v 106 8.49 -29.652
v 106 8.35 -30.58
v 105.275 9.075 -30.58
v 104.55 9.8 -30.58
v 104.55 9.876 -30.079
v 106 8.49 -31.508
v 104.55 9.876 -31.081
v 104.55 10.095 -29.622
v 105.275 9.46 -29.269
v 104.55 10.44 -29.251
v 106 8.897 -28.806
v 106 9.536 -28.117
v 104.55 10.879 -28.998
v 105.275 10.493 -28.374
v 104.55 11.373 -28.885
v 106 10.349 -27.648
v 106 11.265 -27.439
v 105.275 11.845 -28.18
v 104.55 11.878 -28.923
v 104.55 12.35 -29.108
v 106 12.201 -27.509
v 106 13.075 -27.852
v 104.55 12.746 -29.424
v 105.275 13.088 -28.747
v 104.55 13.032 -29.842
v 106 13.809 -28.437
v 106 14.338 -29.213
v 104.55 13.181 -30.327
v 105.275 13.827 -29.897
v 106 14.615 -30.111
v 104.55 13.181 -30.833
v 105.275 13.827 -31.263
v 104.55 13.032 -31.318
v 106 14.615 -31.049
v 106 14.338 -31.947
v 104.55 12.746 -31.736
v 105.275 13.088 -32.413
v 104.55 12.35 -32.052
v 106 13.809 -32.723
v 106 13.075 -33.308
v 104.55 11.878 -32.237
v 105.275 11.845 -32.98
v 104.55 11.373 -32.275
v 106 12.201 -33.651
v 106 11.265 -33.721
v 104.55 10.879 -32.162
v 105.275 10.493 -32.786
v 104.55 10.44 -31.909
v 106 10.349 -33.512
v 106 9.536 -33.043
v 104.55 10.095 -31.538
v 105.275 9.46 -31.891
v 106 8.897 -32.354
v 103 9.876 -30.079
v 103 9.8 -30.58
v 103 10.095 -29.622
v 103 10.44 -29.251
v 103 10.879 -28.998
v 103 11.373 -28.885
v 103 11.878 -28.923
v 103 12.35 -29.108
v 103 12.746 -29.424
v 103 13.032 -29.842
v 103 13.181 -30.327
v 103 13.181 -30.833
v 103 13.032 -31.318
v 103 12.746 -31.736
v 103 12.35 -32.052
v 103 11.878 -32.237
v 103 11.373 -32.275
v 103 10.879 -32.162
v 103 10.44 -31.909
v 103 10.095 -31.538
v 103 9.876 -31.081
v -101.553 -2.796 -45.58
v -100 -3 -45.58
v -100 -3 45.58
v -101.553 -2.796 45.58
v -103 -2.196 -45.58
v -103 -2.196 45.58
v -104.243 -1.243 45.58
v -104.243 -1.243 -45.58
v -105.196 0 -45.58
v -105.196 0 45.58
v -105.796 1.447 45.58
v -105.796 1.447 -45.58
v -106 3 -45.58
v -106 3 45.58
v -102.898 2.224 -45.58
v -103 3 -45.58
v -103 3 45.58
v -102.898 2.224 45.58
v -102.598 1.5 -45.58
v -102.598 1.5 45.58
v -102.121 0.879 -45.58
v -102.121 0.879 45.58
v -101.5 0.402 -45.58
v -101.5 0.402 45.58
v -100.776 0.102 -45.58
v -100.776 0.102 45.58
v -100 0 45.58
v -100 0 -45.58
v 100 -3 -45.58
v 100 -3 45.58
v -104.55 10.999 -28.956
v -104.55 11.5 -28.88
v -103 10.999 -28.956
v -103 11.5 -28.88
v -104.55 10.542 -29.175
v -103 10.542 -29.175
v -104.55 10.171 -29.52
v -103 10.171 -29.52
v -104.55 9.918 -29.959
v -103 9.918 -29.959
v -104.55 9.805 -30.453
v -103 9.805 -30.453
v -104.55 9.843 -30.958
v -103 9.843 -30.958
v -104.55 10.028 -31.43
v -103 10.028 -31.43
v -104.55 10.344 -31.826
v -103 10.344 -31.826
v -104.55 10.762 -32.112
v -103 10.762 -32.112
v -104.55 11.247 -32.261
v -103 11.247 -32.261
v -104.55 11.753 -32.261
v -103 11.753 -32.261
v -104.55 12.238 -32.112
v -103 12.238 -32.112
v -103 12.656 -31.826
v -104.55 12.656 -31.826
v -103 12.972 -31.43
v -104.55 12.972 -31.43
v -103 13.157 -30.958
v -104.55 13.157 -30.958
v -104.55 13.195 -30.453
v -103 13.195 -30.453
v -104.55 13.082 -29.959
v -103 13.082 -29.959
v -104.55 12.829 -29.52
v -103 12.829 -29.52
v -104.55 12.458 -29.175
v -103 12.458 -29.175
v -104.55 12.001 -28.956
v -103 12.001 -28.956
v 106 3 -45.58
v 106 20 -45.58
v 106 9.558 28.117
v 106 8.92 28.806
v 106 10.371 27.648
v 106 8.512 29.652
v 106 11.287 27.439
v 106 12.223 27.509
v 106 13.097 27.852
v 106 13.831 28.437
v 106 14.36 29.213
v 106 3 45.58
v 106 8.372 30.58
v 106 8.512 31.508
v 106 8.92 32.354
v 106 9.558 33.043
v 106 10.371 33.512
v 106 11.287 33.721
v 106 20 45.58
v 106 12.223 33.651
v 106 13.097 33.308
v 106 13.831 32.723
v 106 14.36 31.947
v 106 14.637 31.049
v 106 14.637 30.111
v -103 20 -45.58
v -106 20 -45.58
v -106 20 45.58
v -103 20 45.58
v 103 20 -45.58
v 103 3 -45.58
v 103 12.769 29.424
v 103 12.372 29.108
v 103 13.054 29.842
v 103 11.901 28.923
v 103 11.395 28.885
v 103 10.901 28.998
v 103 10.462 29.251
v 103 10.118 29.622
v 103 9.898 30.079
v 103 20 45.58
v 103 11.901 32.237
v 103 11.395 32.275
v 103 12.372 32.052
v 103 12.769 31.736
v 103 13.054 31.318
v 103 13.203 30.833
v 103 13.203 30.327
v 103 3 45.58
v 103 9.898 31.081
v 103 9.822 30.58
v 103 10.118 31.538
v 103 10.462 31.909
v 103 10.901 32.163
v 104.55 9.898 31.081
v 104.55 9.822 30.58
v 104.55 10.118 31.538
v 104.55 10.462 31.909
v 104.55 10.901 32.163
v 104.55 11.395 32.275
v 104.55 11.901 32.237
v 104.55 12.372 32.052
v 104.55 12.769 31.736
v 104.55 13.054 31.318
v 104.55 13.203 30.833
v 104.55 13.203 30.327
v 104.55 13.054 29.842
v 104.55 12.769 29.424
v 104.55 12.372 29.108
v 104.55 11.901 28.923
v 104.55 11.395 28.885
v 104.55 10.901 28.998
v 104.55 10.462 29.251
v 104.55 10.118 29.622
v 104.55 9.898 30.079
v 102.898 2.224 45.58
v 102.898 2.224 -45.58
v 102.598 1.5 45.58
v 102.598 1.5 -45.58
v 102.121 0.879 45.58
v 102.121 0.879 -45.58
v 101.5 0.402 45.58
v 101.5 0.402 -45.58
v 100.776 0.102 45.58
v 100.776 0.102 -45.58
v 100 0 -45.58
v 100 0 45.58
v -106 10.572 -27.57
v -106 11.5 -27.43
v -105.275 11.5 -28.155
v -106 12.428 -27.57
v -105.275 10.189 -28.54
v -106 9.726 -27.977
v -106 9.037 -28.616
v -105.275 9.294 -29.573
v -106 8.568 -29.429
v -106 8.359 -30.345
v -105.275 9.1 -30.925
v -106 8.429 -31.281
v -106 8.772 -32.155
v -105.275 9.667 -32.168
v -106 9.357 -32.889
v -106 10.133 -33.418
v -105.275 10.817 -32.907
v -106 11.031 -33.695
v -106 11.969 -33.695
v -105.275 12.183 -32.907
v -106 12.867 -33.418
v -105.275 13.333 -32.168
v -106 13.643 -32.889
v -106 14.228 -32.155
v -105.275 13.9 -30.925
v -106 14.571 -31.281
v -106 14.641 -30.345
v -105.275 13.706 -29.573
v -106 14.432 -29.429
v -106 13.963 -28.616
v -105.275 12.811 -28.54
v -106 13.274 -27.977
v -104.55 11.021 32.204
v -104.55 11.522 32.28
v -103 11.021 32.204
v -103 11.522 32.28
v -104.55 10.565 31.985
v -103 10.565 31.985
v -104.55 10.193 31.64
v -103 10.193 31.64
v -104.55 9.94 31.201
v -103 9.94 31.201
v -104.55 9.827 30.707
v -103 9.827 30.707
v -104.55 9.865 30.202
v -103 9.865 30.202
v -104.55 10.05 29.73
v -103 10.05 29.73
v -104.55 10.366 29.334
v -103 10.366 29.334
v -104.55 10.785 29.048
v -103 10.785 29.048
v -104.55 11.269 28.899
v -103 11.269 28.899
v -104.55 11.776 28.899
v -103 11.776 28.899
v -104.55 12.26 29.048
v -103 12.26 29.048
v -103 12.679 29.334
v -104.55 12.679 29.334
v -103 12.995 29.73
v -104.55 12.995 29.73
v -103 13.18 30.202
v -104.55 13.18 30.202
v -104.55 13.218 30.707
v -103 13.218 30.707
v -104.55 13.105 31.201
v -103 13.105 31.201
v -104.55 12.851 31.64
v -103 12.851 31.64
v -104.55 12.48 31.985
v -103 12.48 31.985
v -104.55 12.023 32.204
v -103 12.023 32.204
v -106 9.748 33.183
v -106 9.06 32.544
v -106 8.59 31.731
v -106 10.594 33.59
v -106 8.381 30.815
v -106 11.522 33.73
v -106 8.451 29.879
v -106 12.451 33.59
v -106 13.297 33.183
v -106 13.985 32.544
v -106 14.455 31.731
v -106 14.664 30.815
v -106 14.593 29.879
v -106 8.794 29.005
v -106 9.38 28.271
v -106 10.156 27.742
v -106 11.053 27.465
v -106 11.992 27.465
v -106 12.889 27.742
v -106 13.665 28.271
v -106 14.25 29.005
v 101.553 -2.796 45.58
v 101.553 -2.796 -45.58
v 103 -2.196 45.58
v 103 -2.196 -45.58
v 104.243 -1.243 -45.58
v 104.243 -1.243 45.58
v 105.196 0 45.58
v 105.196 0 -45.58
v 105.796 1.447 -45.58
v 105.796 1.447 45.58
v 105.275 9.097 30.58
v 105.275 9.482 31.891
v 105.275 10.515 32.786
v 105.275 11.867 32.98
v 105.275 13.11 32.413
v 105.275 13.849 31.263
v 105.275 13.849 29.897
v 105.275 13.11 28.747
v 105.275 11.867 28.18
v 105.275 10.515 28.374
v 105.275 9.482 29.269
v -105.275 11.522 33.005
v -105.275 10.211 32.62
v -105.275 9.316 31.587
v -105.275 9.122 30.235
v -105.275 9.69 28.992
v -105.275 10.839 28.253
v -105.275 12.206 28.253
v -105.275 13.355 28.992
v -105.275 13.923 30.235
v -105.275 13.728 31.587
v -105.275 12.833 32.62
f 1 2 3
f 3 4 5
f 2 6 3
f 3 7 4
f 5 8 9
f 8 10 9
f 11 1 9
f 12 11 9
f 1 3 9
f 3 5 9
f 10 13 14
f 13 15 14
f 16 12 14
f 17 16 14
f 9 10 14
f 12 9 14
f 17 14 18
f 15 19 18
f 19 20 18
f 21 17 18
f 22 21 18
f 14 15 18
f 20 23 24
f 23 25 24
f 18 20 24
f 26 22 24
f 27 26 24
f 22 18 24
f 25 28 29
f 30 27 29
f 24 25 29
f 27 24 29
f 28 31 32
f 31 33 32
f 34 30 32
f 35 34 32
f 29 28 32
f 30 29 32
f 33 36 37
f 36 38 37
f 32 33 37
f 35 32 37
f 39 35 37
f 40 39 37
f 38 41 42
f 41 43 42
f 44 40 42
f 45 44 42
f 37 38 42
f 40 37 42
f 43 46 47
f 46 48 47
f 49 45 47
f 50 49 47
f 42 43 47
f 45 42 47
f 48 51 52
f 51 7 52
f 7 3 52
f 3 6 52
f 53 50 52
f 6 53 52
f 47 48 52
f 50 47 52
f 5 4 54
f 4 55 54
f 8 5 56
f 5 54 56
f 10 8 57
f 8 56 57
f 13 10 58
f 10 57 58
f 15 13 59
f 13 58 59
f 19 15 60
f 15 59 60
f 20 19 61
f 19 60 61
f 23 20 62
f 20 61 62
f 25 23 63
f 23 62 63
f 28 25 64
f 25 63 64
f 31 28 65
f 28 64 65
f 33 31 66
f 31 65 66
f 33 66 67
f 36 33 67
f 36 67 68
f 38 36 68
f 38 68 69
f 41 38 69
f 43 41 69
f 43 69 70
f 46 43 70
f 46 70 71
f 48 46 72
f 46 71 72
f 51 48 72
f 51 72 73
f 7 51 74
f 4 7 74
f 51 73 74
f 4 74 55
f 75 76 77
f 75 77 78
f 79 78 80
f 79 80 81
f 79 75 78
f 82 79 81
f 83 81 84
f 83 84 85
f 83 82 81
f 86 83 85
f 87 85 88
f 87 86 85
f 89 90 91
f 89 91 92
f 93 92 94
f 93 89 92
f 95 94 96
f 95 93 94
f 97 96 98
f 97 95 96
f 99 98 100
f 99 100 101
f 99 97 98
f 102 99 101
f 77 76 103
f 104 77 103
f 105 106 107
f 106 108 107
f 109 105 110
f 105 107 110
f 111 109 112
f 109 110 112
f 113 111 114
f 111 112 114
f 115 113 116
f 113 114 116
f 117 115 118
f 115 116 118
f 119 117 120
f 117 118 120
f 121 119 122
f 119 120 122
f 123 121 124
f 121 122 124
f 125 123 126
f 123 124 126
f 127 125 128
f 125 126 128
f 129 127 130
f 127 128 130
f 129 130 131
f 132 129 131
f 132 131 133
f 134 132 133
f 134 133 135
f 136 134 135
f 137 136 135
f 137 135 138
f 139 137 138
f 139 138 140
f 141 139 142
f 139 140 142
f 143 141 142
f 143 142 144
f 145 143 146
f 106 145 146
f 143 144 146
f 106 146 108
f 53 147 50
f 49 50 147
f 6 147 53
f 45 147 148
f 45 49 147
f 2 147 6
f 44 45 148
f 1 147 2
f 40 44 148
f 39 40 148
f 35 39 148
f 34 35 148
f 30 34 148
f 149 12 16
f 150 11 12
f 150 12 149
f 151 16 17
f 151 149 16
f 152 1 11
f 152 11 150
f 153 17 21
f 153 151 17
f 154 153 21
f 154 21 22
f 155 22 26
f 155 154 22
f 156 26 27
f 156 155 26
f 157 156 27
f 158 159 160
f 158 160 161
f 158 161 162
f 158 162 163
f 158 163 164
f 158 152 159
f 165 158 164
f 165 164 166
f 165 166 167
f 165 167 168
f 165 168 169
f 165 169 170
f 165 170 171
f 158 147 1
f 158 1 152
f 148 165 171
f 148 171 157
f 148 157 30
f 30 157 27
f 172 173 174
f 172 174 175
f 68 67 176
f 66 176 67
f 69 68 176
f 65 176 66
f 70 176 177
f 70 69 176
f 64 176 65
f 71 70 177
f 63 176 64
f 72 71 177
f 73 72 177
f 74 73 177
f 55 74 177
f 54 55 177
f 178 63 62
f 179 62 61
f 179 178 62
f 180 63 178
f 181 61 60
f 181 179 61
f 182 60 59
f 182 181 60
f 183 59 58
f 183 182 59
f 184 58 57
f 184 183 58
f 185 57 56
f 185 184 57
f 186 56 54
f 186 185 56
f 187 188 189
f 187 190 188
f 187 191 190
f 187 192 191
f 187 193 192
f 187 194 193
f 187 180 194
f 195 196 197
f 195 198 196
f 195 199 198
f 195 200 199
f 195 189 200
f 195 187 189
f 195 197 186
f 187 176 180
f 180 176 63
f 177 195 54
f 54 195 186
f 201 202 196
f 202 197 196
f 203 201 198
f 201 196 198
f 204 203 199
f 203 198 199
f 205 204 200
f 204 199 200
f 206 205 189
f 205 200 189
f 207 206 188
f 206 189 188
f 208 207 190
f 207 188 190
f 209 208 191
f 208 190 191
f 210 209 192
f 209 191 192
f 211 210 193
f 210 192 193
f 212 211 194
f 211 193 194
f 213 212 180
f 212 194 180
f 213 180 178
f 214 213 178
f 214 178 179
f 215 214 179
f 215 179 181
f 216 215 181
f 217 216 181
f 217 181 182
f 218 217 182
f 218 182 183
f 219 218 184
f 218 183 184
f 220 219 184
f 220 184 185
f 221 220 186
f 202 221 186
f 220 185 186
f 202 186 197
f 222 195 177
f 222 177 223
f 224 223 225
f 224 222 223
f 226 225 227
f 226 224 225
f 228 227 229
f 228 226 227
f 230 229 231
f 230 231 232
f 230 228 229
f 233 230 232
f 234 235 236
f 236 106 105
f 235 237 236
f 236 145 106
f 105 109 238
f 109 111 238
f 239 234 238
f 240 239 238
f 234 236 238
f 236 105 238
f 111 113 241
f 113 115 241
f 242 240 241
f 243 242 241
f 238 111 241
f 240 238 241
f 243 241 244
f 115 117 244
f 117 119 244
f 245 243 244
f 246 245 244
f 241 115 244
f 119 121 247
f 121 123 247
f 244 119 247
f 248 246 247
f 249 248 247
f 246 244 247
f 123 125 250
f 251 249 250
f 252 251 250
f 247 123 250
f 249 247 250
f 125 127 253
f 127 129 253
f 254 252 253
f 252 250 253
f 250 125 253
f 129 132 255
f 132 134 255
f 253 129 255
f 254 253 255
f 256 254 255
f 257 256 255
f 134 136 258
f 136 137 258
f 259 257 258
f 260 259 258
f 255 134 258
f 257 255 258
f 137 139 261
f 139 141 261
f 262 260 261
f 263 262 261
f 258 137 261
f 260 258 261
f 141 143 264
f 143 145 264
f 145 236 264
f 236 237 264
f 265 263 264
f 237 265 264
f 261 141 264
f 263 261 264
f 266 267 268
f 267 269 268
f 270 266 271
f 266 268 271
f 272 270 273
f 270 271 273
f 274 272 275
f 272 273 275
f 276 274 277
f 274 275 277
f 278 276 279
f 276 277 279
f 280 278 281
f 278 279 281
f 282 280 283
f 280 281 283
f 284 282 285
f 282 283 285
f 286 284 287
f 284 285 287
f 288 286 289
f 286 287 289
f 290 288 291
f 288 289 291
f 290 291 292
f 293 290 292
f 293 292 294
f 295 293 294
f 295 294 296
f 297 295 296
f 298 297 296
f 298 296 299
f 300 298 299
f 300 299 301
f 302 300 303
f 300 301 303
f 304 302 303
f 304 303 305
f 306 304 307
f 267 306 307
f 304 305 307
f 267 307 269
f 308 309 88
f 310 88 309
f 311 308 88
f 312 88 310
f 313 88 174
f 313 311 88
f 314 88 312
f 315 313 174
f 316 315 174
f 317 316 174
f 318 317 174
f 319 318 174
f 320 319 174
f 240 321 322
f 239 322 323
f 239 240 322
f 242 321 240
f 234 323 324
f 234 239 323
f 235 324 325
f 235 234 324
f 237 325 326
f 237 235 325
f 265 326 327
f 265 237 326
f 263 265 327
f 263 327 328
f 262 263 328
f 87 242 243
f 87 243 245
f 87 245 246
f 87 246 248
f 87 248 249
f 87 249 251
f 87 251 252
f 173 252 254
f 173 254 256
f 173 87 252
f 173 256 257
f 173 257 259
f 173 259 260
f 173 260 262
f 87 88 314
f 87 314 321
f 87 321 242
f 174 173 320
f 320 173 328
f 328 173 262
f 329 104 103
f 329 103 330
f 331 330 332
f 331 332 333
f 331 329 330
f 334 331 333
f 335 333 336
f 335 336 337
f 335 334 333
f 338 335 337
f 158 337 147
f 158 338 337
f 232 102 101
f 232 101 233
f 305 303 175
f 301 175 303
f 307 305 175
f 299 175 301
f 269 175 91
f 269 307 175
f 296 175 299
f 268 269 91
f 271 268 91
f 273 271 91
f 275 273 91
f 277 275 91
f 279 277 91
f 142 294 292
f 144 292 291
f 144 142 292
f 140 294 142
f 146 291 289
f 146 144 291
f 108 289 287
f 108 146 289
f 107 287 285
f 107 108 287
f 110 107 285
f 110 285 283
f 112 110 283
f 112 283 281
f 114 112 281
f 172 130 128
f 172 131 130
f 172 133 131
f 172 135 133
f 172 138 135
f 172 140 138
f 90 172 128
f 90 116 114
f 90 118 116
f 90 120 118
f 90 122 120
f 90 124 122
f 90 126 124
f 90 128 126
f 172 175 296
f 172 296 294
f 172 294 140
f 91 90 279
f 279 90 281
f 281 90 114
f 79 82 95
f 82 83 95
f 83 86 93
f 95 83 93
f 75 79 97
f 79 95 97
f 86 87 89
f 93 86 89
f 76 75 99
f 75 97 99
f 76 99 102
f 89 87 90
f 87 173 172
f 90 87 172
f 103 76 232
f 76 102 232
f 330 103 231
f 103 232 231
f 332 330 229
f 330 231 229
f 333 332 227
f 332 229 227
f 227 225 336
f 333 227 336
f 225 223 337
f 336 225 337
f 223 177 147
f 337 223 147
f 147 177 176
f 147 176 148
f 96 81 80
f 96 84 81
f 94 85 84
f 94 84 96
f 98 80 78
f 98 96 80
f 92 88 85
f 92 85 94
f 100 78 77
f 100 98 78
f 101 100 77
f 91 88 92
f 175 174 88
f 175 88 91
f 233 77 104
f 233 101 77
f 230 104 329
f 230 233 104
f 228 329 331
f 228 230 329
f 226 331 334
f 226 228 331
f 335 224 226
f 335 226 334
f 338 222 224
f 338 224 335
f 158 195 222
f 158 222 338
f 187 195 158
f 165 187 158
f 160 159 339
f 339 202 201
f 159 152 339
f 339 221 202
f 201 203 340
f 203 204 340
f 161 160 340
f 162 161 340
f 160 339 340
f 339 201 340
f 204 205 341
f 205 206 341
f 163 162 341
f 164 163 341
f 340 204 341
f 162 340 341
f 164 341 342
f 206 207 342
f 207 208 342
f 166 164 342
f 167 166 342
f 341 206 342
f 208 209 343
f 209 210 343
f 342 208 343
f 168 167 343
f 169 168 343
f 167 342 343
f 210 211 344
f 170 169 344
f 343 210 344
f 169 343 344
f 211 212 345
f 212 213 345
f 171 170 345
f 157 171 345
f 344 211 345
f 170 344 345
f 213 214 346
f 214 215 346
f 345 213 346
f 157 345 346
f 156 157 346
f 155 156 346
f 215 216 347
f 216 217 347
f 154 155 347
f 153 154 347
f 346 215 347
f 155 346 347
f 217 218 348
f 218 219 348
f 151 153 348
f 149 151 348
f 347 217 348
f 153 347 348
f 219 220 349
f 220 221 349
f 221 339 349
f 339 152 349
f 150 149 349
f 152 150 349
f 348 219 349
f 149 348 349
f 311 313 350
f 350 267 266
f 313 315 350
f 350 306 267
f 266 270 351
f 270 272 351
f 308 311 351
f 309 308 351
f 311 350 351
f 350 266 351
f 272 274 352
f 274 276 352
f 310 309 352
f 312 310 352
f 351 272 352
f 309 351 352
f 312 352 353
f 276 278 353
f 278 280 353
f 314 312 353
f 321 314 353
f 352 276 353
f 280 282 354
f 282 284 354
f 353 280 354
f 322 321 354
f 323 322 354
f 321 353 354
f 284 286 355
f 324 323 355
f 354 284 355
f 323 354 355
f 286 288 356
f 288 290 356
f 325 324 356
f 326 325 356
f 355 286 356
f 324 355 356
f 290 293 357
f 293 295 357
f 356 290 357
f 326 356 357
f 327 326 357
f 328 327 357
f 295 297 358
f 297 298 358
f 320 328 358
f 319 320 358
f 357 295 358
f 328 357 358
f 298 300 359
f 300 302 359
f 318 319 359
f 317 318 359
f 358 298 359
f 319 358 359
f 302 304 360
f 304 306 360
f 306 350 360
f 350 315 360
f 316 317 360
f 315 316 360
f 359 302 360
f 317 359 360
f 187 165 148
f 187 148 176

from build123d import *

# Parameters (mm, degrees)
SKETCH_1_W                            = 200
SKETCH_1_H                            = 91.16
SM_BASE_FLANGE_1_DEPTH                = 3
SM_EDGE_FLANGE_1_DEPTH                = 91.16
SM_EDGE_FLANGE_1_BEND_DEPTH           = 91.16
HOLE_WIZARD_M31_D                     = 3.4
HOLE_WIZARD_M31_DEPTH                 = 8.5
HOLE_WIZARD_M31_CSINK_D               = 6.3
HOLE_WIZARD_M31_CSINK_ANGLE           = 90
HOLE_WIZARD_M31_TIP                   = 1.021463052
HOLE_WIZARD_M31_ON_FACE_2_D           = 3.4
HOLE_WIZARD_M31_ON_FACE_2_DEPTH       = 8.5
HOLE_WIZARD_M31_ON_FACE_2_CSINK_D     = 6.3
HOLE_WIZARD_M31_ON_FACE_2_CSINK_ANGLE = 90
HOLE_WIZARD_M31_ON_FACE_2_TIP         = 1.021463052


# Sheet-metal steps are written as plain solids
with BuildPart() as part:
    # Sketch 1 → Базовая кромка1 (new body)
    with BuildSketch(Plane(origin=(0, 0, 0), x_dir=(1, 0, 0), z_dir=(0, 1, 0))):
        Rectangle(SKETCH_1_W, SKETCH_1_H)
    extrude(amount=-SM_BASE_FLANGE_1_DEPTH)

    # Ребро-кромка1 section (across the edge) → Ребро-кромка1 (add)
    with BuildSketch(Plane(origin=(-103, 0, -45.58), x_dir=(1, 0, 0), z_dir=(0, 0, 1))):
        with BuildLine():
            Line((-3, 3), (-3, 20))
            Line((-3, 20), (0, 20))
            Line((0, 20), (0, 3))
            ThreePointArc((0, 3), (0.878679656, 0.878679656), (3, 0))
            Line((3, 0), (3, -3))
            ThreePointArc((3, -3), (-1.242640687, -1.242640687), (-3, 3))
        make_face()
    extrude(amount=SM_EDGE_FLANGE_1_DEPTH)

    # Ребро-кромка1 section 2 (across the edge) → Ребро-кромка1 bend (add)
    with BuildSketch(Plane(origin=(103, 0, 45.58), x_dir=(-1, 0, 0), z_dir=(0, 0, -1))):
        with BuildLine():
            Line((-3, 3), (-3, 20))
            Line((-3, 20), (0, 20))
            Line((0, 20), (0, 3))
            ThreePointArc((0, 3), (0.878679656, 0.878679656), (3, 0))
            Line((3, 0), (3, -3))
            ThreePointArc((3, -3), (-1.242640687, -1.242640687), (-3, 3))
        make_face()
    extrude(amount=SM_EDGE_FLANGE_1_BEND_DEPTH)

    # Зенковка для  винта с плоской головкой M31
    with Locations(Plane(origin=(106, 11.522322038, 30.580016609), x_dir=(0, 1, 0), z_dir=(1, 0, 0))):
        with Locations((0, 0), (-0.022322038, -61.160016609)):
            CounterSinkHole(HOLE_WIZARD_M31_D / 2, HOLE_WIZARD_M31_CSINK_D / 2, depth=HOLE_WIZARD_M31_DEPTH, counter_sink_angle=HOLE_WIZARD_M31_CSINK_ANGLE)
            with Locations((0, 0, -(HOLE_WIZARD_M31_DEPTH + HOLE_WIZARD_M31_TIP / 2))):  # 118° drill point
                Cone(0, HOLE_WIZARD_M31_D / 2, HOLE_WIZARD_M31_TIP, mode=Mode.SUBTRACT)

    # Зенковка для  винта с плоской головкой M31 on face 2
    with Locations(Plane(origin=(-106, 11.5, -30.58), x_dir=(0, 0, -1), z_dir=(-1, 0, 0))):
        with Locations((0, 0), (-61.160016609, -0.022322038)):
            CounterSinkHole(HOLE_WIZARD_M31_ON_FACE_2_D / 2, HOLE_WIZARD_M31_ON_FACE_2_CSINK_D / 2, depth=HOLE_WIZARD_M31_ON_FACE_2_DEPTH, counter_sink_angle=HOLE_WIZARD_M31_ON_FACE_2_CSINK_ANGLE)
            with Locations((0, 0, -(HOLE_WIZARD_M31_ON_FACE_2_DEPTH + HOLE_WIZARD_M31_ON_FACE_2_TIP / 2))):  # 118° drill point
                Cone(0, HOLE_WIZARD_M31_ON_FACE_2_D / 2, HOLE_WIZARD_M31_ON_FACE_2_TIP, mode=Mode.SUBTRACT)


solid = part.part
